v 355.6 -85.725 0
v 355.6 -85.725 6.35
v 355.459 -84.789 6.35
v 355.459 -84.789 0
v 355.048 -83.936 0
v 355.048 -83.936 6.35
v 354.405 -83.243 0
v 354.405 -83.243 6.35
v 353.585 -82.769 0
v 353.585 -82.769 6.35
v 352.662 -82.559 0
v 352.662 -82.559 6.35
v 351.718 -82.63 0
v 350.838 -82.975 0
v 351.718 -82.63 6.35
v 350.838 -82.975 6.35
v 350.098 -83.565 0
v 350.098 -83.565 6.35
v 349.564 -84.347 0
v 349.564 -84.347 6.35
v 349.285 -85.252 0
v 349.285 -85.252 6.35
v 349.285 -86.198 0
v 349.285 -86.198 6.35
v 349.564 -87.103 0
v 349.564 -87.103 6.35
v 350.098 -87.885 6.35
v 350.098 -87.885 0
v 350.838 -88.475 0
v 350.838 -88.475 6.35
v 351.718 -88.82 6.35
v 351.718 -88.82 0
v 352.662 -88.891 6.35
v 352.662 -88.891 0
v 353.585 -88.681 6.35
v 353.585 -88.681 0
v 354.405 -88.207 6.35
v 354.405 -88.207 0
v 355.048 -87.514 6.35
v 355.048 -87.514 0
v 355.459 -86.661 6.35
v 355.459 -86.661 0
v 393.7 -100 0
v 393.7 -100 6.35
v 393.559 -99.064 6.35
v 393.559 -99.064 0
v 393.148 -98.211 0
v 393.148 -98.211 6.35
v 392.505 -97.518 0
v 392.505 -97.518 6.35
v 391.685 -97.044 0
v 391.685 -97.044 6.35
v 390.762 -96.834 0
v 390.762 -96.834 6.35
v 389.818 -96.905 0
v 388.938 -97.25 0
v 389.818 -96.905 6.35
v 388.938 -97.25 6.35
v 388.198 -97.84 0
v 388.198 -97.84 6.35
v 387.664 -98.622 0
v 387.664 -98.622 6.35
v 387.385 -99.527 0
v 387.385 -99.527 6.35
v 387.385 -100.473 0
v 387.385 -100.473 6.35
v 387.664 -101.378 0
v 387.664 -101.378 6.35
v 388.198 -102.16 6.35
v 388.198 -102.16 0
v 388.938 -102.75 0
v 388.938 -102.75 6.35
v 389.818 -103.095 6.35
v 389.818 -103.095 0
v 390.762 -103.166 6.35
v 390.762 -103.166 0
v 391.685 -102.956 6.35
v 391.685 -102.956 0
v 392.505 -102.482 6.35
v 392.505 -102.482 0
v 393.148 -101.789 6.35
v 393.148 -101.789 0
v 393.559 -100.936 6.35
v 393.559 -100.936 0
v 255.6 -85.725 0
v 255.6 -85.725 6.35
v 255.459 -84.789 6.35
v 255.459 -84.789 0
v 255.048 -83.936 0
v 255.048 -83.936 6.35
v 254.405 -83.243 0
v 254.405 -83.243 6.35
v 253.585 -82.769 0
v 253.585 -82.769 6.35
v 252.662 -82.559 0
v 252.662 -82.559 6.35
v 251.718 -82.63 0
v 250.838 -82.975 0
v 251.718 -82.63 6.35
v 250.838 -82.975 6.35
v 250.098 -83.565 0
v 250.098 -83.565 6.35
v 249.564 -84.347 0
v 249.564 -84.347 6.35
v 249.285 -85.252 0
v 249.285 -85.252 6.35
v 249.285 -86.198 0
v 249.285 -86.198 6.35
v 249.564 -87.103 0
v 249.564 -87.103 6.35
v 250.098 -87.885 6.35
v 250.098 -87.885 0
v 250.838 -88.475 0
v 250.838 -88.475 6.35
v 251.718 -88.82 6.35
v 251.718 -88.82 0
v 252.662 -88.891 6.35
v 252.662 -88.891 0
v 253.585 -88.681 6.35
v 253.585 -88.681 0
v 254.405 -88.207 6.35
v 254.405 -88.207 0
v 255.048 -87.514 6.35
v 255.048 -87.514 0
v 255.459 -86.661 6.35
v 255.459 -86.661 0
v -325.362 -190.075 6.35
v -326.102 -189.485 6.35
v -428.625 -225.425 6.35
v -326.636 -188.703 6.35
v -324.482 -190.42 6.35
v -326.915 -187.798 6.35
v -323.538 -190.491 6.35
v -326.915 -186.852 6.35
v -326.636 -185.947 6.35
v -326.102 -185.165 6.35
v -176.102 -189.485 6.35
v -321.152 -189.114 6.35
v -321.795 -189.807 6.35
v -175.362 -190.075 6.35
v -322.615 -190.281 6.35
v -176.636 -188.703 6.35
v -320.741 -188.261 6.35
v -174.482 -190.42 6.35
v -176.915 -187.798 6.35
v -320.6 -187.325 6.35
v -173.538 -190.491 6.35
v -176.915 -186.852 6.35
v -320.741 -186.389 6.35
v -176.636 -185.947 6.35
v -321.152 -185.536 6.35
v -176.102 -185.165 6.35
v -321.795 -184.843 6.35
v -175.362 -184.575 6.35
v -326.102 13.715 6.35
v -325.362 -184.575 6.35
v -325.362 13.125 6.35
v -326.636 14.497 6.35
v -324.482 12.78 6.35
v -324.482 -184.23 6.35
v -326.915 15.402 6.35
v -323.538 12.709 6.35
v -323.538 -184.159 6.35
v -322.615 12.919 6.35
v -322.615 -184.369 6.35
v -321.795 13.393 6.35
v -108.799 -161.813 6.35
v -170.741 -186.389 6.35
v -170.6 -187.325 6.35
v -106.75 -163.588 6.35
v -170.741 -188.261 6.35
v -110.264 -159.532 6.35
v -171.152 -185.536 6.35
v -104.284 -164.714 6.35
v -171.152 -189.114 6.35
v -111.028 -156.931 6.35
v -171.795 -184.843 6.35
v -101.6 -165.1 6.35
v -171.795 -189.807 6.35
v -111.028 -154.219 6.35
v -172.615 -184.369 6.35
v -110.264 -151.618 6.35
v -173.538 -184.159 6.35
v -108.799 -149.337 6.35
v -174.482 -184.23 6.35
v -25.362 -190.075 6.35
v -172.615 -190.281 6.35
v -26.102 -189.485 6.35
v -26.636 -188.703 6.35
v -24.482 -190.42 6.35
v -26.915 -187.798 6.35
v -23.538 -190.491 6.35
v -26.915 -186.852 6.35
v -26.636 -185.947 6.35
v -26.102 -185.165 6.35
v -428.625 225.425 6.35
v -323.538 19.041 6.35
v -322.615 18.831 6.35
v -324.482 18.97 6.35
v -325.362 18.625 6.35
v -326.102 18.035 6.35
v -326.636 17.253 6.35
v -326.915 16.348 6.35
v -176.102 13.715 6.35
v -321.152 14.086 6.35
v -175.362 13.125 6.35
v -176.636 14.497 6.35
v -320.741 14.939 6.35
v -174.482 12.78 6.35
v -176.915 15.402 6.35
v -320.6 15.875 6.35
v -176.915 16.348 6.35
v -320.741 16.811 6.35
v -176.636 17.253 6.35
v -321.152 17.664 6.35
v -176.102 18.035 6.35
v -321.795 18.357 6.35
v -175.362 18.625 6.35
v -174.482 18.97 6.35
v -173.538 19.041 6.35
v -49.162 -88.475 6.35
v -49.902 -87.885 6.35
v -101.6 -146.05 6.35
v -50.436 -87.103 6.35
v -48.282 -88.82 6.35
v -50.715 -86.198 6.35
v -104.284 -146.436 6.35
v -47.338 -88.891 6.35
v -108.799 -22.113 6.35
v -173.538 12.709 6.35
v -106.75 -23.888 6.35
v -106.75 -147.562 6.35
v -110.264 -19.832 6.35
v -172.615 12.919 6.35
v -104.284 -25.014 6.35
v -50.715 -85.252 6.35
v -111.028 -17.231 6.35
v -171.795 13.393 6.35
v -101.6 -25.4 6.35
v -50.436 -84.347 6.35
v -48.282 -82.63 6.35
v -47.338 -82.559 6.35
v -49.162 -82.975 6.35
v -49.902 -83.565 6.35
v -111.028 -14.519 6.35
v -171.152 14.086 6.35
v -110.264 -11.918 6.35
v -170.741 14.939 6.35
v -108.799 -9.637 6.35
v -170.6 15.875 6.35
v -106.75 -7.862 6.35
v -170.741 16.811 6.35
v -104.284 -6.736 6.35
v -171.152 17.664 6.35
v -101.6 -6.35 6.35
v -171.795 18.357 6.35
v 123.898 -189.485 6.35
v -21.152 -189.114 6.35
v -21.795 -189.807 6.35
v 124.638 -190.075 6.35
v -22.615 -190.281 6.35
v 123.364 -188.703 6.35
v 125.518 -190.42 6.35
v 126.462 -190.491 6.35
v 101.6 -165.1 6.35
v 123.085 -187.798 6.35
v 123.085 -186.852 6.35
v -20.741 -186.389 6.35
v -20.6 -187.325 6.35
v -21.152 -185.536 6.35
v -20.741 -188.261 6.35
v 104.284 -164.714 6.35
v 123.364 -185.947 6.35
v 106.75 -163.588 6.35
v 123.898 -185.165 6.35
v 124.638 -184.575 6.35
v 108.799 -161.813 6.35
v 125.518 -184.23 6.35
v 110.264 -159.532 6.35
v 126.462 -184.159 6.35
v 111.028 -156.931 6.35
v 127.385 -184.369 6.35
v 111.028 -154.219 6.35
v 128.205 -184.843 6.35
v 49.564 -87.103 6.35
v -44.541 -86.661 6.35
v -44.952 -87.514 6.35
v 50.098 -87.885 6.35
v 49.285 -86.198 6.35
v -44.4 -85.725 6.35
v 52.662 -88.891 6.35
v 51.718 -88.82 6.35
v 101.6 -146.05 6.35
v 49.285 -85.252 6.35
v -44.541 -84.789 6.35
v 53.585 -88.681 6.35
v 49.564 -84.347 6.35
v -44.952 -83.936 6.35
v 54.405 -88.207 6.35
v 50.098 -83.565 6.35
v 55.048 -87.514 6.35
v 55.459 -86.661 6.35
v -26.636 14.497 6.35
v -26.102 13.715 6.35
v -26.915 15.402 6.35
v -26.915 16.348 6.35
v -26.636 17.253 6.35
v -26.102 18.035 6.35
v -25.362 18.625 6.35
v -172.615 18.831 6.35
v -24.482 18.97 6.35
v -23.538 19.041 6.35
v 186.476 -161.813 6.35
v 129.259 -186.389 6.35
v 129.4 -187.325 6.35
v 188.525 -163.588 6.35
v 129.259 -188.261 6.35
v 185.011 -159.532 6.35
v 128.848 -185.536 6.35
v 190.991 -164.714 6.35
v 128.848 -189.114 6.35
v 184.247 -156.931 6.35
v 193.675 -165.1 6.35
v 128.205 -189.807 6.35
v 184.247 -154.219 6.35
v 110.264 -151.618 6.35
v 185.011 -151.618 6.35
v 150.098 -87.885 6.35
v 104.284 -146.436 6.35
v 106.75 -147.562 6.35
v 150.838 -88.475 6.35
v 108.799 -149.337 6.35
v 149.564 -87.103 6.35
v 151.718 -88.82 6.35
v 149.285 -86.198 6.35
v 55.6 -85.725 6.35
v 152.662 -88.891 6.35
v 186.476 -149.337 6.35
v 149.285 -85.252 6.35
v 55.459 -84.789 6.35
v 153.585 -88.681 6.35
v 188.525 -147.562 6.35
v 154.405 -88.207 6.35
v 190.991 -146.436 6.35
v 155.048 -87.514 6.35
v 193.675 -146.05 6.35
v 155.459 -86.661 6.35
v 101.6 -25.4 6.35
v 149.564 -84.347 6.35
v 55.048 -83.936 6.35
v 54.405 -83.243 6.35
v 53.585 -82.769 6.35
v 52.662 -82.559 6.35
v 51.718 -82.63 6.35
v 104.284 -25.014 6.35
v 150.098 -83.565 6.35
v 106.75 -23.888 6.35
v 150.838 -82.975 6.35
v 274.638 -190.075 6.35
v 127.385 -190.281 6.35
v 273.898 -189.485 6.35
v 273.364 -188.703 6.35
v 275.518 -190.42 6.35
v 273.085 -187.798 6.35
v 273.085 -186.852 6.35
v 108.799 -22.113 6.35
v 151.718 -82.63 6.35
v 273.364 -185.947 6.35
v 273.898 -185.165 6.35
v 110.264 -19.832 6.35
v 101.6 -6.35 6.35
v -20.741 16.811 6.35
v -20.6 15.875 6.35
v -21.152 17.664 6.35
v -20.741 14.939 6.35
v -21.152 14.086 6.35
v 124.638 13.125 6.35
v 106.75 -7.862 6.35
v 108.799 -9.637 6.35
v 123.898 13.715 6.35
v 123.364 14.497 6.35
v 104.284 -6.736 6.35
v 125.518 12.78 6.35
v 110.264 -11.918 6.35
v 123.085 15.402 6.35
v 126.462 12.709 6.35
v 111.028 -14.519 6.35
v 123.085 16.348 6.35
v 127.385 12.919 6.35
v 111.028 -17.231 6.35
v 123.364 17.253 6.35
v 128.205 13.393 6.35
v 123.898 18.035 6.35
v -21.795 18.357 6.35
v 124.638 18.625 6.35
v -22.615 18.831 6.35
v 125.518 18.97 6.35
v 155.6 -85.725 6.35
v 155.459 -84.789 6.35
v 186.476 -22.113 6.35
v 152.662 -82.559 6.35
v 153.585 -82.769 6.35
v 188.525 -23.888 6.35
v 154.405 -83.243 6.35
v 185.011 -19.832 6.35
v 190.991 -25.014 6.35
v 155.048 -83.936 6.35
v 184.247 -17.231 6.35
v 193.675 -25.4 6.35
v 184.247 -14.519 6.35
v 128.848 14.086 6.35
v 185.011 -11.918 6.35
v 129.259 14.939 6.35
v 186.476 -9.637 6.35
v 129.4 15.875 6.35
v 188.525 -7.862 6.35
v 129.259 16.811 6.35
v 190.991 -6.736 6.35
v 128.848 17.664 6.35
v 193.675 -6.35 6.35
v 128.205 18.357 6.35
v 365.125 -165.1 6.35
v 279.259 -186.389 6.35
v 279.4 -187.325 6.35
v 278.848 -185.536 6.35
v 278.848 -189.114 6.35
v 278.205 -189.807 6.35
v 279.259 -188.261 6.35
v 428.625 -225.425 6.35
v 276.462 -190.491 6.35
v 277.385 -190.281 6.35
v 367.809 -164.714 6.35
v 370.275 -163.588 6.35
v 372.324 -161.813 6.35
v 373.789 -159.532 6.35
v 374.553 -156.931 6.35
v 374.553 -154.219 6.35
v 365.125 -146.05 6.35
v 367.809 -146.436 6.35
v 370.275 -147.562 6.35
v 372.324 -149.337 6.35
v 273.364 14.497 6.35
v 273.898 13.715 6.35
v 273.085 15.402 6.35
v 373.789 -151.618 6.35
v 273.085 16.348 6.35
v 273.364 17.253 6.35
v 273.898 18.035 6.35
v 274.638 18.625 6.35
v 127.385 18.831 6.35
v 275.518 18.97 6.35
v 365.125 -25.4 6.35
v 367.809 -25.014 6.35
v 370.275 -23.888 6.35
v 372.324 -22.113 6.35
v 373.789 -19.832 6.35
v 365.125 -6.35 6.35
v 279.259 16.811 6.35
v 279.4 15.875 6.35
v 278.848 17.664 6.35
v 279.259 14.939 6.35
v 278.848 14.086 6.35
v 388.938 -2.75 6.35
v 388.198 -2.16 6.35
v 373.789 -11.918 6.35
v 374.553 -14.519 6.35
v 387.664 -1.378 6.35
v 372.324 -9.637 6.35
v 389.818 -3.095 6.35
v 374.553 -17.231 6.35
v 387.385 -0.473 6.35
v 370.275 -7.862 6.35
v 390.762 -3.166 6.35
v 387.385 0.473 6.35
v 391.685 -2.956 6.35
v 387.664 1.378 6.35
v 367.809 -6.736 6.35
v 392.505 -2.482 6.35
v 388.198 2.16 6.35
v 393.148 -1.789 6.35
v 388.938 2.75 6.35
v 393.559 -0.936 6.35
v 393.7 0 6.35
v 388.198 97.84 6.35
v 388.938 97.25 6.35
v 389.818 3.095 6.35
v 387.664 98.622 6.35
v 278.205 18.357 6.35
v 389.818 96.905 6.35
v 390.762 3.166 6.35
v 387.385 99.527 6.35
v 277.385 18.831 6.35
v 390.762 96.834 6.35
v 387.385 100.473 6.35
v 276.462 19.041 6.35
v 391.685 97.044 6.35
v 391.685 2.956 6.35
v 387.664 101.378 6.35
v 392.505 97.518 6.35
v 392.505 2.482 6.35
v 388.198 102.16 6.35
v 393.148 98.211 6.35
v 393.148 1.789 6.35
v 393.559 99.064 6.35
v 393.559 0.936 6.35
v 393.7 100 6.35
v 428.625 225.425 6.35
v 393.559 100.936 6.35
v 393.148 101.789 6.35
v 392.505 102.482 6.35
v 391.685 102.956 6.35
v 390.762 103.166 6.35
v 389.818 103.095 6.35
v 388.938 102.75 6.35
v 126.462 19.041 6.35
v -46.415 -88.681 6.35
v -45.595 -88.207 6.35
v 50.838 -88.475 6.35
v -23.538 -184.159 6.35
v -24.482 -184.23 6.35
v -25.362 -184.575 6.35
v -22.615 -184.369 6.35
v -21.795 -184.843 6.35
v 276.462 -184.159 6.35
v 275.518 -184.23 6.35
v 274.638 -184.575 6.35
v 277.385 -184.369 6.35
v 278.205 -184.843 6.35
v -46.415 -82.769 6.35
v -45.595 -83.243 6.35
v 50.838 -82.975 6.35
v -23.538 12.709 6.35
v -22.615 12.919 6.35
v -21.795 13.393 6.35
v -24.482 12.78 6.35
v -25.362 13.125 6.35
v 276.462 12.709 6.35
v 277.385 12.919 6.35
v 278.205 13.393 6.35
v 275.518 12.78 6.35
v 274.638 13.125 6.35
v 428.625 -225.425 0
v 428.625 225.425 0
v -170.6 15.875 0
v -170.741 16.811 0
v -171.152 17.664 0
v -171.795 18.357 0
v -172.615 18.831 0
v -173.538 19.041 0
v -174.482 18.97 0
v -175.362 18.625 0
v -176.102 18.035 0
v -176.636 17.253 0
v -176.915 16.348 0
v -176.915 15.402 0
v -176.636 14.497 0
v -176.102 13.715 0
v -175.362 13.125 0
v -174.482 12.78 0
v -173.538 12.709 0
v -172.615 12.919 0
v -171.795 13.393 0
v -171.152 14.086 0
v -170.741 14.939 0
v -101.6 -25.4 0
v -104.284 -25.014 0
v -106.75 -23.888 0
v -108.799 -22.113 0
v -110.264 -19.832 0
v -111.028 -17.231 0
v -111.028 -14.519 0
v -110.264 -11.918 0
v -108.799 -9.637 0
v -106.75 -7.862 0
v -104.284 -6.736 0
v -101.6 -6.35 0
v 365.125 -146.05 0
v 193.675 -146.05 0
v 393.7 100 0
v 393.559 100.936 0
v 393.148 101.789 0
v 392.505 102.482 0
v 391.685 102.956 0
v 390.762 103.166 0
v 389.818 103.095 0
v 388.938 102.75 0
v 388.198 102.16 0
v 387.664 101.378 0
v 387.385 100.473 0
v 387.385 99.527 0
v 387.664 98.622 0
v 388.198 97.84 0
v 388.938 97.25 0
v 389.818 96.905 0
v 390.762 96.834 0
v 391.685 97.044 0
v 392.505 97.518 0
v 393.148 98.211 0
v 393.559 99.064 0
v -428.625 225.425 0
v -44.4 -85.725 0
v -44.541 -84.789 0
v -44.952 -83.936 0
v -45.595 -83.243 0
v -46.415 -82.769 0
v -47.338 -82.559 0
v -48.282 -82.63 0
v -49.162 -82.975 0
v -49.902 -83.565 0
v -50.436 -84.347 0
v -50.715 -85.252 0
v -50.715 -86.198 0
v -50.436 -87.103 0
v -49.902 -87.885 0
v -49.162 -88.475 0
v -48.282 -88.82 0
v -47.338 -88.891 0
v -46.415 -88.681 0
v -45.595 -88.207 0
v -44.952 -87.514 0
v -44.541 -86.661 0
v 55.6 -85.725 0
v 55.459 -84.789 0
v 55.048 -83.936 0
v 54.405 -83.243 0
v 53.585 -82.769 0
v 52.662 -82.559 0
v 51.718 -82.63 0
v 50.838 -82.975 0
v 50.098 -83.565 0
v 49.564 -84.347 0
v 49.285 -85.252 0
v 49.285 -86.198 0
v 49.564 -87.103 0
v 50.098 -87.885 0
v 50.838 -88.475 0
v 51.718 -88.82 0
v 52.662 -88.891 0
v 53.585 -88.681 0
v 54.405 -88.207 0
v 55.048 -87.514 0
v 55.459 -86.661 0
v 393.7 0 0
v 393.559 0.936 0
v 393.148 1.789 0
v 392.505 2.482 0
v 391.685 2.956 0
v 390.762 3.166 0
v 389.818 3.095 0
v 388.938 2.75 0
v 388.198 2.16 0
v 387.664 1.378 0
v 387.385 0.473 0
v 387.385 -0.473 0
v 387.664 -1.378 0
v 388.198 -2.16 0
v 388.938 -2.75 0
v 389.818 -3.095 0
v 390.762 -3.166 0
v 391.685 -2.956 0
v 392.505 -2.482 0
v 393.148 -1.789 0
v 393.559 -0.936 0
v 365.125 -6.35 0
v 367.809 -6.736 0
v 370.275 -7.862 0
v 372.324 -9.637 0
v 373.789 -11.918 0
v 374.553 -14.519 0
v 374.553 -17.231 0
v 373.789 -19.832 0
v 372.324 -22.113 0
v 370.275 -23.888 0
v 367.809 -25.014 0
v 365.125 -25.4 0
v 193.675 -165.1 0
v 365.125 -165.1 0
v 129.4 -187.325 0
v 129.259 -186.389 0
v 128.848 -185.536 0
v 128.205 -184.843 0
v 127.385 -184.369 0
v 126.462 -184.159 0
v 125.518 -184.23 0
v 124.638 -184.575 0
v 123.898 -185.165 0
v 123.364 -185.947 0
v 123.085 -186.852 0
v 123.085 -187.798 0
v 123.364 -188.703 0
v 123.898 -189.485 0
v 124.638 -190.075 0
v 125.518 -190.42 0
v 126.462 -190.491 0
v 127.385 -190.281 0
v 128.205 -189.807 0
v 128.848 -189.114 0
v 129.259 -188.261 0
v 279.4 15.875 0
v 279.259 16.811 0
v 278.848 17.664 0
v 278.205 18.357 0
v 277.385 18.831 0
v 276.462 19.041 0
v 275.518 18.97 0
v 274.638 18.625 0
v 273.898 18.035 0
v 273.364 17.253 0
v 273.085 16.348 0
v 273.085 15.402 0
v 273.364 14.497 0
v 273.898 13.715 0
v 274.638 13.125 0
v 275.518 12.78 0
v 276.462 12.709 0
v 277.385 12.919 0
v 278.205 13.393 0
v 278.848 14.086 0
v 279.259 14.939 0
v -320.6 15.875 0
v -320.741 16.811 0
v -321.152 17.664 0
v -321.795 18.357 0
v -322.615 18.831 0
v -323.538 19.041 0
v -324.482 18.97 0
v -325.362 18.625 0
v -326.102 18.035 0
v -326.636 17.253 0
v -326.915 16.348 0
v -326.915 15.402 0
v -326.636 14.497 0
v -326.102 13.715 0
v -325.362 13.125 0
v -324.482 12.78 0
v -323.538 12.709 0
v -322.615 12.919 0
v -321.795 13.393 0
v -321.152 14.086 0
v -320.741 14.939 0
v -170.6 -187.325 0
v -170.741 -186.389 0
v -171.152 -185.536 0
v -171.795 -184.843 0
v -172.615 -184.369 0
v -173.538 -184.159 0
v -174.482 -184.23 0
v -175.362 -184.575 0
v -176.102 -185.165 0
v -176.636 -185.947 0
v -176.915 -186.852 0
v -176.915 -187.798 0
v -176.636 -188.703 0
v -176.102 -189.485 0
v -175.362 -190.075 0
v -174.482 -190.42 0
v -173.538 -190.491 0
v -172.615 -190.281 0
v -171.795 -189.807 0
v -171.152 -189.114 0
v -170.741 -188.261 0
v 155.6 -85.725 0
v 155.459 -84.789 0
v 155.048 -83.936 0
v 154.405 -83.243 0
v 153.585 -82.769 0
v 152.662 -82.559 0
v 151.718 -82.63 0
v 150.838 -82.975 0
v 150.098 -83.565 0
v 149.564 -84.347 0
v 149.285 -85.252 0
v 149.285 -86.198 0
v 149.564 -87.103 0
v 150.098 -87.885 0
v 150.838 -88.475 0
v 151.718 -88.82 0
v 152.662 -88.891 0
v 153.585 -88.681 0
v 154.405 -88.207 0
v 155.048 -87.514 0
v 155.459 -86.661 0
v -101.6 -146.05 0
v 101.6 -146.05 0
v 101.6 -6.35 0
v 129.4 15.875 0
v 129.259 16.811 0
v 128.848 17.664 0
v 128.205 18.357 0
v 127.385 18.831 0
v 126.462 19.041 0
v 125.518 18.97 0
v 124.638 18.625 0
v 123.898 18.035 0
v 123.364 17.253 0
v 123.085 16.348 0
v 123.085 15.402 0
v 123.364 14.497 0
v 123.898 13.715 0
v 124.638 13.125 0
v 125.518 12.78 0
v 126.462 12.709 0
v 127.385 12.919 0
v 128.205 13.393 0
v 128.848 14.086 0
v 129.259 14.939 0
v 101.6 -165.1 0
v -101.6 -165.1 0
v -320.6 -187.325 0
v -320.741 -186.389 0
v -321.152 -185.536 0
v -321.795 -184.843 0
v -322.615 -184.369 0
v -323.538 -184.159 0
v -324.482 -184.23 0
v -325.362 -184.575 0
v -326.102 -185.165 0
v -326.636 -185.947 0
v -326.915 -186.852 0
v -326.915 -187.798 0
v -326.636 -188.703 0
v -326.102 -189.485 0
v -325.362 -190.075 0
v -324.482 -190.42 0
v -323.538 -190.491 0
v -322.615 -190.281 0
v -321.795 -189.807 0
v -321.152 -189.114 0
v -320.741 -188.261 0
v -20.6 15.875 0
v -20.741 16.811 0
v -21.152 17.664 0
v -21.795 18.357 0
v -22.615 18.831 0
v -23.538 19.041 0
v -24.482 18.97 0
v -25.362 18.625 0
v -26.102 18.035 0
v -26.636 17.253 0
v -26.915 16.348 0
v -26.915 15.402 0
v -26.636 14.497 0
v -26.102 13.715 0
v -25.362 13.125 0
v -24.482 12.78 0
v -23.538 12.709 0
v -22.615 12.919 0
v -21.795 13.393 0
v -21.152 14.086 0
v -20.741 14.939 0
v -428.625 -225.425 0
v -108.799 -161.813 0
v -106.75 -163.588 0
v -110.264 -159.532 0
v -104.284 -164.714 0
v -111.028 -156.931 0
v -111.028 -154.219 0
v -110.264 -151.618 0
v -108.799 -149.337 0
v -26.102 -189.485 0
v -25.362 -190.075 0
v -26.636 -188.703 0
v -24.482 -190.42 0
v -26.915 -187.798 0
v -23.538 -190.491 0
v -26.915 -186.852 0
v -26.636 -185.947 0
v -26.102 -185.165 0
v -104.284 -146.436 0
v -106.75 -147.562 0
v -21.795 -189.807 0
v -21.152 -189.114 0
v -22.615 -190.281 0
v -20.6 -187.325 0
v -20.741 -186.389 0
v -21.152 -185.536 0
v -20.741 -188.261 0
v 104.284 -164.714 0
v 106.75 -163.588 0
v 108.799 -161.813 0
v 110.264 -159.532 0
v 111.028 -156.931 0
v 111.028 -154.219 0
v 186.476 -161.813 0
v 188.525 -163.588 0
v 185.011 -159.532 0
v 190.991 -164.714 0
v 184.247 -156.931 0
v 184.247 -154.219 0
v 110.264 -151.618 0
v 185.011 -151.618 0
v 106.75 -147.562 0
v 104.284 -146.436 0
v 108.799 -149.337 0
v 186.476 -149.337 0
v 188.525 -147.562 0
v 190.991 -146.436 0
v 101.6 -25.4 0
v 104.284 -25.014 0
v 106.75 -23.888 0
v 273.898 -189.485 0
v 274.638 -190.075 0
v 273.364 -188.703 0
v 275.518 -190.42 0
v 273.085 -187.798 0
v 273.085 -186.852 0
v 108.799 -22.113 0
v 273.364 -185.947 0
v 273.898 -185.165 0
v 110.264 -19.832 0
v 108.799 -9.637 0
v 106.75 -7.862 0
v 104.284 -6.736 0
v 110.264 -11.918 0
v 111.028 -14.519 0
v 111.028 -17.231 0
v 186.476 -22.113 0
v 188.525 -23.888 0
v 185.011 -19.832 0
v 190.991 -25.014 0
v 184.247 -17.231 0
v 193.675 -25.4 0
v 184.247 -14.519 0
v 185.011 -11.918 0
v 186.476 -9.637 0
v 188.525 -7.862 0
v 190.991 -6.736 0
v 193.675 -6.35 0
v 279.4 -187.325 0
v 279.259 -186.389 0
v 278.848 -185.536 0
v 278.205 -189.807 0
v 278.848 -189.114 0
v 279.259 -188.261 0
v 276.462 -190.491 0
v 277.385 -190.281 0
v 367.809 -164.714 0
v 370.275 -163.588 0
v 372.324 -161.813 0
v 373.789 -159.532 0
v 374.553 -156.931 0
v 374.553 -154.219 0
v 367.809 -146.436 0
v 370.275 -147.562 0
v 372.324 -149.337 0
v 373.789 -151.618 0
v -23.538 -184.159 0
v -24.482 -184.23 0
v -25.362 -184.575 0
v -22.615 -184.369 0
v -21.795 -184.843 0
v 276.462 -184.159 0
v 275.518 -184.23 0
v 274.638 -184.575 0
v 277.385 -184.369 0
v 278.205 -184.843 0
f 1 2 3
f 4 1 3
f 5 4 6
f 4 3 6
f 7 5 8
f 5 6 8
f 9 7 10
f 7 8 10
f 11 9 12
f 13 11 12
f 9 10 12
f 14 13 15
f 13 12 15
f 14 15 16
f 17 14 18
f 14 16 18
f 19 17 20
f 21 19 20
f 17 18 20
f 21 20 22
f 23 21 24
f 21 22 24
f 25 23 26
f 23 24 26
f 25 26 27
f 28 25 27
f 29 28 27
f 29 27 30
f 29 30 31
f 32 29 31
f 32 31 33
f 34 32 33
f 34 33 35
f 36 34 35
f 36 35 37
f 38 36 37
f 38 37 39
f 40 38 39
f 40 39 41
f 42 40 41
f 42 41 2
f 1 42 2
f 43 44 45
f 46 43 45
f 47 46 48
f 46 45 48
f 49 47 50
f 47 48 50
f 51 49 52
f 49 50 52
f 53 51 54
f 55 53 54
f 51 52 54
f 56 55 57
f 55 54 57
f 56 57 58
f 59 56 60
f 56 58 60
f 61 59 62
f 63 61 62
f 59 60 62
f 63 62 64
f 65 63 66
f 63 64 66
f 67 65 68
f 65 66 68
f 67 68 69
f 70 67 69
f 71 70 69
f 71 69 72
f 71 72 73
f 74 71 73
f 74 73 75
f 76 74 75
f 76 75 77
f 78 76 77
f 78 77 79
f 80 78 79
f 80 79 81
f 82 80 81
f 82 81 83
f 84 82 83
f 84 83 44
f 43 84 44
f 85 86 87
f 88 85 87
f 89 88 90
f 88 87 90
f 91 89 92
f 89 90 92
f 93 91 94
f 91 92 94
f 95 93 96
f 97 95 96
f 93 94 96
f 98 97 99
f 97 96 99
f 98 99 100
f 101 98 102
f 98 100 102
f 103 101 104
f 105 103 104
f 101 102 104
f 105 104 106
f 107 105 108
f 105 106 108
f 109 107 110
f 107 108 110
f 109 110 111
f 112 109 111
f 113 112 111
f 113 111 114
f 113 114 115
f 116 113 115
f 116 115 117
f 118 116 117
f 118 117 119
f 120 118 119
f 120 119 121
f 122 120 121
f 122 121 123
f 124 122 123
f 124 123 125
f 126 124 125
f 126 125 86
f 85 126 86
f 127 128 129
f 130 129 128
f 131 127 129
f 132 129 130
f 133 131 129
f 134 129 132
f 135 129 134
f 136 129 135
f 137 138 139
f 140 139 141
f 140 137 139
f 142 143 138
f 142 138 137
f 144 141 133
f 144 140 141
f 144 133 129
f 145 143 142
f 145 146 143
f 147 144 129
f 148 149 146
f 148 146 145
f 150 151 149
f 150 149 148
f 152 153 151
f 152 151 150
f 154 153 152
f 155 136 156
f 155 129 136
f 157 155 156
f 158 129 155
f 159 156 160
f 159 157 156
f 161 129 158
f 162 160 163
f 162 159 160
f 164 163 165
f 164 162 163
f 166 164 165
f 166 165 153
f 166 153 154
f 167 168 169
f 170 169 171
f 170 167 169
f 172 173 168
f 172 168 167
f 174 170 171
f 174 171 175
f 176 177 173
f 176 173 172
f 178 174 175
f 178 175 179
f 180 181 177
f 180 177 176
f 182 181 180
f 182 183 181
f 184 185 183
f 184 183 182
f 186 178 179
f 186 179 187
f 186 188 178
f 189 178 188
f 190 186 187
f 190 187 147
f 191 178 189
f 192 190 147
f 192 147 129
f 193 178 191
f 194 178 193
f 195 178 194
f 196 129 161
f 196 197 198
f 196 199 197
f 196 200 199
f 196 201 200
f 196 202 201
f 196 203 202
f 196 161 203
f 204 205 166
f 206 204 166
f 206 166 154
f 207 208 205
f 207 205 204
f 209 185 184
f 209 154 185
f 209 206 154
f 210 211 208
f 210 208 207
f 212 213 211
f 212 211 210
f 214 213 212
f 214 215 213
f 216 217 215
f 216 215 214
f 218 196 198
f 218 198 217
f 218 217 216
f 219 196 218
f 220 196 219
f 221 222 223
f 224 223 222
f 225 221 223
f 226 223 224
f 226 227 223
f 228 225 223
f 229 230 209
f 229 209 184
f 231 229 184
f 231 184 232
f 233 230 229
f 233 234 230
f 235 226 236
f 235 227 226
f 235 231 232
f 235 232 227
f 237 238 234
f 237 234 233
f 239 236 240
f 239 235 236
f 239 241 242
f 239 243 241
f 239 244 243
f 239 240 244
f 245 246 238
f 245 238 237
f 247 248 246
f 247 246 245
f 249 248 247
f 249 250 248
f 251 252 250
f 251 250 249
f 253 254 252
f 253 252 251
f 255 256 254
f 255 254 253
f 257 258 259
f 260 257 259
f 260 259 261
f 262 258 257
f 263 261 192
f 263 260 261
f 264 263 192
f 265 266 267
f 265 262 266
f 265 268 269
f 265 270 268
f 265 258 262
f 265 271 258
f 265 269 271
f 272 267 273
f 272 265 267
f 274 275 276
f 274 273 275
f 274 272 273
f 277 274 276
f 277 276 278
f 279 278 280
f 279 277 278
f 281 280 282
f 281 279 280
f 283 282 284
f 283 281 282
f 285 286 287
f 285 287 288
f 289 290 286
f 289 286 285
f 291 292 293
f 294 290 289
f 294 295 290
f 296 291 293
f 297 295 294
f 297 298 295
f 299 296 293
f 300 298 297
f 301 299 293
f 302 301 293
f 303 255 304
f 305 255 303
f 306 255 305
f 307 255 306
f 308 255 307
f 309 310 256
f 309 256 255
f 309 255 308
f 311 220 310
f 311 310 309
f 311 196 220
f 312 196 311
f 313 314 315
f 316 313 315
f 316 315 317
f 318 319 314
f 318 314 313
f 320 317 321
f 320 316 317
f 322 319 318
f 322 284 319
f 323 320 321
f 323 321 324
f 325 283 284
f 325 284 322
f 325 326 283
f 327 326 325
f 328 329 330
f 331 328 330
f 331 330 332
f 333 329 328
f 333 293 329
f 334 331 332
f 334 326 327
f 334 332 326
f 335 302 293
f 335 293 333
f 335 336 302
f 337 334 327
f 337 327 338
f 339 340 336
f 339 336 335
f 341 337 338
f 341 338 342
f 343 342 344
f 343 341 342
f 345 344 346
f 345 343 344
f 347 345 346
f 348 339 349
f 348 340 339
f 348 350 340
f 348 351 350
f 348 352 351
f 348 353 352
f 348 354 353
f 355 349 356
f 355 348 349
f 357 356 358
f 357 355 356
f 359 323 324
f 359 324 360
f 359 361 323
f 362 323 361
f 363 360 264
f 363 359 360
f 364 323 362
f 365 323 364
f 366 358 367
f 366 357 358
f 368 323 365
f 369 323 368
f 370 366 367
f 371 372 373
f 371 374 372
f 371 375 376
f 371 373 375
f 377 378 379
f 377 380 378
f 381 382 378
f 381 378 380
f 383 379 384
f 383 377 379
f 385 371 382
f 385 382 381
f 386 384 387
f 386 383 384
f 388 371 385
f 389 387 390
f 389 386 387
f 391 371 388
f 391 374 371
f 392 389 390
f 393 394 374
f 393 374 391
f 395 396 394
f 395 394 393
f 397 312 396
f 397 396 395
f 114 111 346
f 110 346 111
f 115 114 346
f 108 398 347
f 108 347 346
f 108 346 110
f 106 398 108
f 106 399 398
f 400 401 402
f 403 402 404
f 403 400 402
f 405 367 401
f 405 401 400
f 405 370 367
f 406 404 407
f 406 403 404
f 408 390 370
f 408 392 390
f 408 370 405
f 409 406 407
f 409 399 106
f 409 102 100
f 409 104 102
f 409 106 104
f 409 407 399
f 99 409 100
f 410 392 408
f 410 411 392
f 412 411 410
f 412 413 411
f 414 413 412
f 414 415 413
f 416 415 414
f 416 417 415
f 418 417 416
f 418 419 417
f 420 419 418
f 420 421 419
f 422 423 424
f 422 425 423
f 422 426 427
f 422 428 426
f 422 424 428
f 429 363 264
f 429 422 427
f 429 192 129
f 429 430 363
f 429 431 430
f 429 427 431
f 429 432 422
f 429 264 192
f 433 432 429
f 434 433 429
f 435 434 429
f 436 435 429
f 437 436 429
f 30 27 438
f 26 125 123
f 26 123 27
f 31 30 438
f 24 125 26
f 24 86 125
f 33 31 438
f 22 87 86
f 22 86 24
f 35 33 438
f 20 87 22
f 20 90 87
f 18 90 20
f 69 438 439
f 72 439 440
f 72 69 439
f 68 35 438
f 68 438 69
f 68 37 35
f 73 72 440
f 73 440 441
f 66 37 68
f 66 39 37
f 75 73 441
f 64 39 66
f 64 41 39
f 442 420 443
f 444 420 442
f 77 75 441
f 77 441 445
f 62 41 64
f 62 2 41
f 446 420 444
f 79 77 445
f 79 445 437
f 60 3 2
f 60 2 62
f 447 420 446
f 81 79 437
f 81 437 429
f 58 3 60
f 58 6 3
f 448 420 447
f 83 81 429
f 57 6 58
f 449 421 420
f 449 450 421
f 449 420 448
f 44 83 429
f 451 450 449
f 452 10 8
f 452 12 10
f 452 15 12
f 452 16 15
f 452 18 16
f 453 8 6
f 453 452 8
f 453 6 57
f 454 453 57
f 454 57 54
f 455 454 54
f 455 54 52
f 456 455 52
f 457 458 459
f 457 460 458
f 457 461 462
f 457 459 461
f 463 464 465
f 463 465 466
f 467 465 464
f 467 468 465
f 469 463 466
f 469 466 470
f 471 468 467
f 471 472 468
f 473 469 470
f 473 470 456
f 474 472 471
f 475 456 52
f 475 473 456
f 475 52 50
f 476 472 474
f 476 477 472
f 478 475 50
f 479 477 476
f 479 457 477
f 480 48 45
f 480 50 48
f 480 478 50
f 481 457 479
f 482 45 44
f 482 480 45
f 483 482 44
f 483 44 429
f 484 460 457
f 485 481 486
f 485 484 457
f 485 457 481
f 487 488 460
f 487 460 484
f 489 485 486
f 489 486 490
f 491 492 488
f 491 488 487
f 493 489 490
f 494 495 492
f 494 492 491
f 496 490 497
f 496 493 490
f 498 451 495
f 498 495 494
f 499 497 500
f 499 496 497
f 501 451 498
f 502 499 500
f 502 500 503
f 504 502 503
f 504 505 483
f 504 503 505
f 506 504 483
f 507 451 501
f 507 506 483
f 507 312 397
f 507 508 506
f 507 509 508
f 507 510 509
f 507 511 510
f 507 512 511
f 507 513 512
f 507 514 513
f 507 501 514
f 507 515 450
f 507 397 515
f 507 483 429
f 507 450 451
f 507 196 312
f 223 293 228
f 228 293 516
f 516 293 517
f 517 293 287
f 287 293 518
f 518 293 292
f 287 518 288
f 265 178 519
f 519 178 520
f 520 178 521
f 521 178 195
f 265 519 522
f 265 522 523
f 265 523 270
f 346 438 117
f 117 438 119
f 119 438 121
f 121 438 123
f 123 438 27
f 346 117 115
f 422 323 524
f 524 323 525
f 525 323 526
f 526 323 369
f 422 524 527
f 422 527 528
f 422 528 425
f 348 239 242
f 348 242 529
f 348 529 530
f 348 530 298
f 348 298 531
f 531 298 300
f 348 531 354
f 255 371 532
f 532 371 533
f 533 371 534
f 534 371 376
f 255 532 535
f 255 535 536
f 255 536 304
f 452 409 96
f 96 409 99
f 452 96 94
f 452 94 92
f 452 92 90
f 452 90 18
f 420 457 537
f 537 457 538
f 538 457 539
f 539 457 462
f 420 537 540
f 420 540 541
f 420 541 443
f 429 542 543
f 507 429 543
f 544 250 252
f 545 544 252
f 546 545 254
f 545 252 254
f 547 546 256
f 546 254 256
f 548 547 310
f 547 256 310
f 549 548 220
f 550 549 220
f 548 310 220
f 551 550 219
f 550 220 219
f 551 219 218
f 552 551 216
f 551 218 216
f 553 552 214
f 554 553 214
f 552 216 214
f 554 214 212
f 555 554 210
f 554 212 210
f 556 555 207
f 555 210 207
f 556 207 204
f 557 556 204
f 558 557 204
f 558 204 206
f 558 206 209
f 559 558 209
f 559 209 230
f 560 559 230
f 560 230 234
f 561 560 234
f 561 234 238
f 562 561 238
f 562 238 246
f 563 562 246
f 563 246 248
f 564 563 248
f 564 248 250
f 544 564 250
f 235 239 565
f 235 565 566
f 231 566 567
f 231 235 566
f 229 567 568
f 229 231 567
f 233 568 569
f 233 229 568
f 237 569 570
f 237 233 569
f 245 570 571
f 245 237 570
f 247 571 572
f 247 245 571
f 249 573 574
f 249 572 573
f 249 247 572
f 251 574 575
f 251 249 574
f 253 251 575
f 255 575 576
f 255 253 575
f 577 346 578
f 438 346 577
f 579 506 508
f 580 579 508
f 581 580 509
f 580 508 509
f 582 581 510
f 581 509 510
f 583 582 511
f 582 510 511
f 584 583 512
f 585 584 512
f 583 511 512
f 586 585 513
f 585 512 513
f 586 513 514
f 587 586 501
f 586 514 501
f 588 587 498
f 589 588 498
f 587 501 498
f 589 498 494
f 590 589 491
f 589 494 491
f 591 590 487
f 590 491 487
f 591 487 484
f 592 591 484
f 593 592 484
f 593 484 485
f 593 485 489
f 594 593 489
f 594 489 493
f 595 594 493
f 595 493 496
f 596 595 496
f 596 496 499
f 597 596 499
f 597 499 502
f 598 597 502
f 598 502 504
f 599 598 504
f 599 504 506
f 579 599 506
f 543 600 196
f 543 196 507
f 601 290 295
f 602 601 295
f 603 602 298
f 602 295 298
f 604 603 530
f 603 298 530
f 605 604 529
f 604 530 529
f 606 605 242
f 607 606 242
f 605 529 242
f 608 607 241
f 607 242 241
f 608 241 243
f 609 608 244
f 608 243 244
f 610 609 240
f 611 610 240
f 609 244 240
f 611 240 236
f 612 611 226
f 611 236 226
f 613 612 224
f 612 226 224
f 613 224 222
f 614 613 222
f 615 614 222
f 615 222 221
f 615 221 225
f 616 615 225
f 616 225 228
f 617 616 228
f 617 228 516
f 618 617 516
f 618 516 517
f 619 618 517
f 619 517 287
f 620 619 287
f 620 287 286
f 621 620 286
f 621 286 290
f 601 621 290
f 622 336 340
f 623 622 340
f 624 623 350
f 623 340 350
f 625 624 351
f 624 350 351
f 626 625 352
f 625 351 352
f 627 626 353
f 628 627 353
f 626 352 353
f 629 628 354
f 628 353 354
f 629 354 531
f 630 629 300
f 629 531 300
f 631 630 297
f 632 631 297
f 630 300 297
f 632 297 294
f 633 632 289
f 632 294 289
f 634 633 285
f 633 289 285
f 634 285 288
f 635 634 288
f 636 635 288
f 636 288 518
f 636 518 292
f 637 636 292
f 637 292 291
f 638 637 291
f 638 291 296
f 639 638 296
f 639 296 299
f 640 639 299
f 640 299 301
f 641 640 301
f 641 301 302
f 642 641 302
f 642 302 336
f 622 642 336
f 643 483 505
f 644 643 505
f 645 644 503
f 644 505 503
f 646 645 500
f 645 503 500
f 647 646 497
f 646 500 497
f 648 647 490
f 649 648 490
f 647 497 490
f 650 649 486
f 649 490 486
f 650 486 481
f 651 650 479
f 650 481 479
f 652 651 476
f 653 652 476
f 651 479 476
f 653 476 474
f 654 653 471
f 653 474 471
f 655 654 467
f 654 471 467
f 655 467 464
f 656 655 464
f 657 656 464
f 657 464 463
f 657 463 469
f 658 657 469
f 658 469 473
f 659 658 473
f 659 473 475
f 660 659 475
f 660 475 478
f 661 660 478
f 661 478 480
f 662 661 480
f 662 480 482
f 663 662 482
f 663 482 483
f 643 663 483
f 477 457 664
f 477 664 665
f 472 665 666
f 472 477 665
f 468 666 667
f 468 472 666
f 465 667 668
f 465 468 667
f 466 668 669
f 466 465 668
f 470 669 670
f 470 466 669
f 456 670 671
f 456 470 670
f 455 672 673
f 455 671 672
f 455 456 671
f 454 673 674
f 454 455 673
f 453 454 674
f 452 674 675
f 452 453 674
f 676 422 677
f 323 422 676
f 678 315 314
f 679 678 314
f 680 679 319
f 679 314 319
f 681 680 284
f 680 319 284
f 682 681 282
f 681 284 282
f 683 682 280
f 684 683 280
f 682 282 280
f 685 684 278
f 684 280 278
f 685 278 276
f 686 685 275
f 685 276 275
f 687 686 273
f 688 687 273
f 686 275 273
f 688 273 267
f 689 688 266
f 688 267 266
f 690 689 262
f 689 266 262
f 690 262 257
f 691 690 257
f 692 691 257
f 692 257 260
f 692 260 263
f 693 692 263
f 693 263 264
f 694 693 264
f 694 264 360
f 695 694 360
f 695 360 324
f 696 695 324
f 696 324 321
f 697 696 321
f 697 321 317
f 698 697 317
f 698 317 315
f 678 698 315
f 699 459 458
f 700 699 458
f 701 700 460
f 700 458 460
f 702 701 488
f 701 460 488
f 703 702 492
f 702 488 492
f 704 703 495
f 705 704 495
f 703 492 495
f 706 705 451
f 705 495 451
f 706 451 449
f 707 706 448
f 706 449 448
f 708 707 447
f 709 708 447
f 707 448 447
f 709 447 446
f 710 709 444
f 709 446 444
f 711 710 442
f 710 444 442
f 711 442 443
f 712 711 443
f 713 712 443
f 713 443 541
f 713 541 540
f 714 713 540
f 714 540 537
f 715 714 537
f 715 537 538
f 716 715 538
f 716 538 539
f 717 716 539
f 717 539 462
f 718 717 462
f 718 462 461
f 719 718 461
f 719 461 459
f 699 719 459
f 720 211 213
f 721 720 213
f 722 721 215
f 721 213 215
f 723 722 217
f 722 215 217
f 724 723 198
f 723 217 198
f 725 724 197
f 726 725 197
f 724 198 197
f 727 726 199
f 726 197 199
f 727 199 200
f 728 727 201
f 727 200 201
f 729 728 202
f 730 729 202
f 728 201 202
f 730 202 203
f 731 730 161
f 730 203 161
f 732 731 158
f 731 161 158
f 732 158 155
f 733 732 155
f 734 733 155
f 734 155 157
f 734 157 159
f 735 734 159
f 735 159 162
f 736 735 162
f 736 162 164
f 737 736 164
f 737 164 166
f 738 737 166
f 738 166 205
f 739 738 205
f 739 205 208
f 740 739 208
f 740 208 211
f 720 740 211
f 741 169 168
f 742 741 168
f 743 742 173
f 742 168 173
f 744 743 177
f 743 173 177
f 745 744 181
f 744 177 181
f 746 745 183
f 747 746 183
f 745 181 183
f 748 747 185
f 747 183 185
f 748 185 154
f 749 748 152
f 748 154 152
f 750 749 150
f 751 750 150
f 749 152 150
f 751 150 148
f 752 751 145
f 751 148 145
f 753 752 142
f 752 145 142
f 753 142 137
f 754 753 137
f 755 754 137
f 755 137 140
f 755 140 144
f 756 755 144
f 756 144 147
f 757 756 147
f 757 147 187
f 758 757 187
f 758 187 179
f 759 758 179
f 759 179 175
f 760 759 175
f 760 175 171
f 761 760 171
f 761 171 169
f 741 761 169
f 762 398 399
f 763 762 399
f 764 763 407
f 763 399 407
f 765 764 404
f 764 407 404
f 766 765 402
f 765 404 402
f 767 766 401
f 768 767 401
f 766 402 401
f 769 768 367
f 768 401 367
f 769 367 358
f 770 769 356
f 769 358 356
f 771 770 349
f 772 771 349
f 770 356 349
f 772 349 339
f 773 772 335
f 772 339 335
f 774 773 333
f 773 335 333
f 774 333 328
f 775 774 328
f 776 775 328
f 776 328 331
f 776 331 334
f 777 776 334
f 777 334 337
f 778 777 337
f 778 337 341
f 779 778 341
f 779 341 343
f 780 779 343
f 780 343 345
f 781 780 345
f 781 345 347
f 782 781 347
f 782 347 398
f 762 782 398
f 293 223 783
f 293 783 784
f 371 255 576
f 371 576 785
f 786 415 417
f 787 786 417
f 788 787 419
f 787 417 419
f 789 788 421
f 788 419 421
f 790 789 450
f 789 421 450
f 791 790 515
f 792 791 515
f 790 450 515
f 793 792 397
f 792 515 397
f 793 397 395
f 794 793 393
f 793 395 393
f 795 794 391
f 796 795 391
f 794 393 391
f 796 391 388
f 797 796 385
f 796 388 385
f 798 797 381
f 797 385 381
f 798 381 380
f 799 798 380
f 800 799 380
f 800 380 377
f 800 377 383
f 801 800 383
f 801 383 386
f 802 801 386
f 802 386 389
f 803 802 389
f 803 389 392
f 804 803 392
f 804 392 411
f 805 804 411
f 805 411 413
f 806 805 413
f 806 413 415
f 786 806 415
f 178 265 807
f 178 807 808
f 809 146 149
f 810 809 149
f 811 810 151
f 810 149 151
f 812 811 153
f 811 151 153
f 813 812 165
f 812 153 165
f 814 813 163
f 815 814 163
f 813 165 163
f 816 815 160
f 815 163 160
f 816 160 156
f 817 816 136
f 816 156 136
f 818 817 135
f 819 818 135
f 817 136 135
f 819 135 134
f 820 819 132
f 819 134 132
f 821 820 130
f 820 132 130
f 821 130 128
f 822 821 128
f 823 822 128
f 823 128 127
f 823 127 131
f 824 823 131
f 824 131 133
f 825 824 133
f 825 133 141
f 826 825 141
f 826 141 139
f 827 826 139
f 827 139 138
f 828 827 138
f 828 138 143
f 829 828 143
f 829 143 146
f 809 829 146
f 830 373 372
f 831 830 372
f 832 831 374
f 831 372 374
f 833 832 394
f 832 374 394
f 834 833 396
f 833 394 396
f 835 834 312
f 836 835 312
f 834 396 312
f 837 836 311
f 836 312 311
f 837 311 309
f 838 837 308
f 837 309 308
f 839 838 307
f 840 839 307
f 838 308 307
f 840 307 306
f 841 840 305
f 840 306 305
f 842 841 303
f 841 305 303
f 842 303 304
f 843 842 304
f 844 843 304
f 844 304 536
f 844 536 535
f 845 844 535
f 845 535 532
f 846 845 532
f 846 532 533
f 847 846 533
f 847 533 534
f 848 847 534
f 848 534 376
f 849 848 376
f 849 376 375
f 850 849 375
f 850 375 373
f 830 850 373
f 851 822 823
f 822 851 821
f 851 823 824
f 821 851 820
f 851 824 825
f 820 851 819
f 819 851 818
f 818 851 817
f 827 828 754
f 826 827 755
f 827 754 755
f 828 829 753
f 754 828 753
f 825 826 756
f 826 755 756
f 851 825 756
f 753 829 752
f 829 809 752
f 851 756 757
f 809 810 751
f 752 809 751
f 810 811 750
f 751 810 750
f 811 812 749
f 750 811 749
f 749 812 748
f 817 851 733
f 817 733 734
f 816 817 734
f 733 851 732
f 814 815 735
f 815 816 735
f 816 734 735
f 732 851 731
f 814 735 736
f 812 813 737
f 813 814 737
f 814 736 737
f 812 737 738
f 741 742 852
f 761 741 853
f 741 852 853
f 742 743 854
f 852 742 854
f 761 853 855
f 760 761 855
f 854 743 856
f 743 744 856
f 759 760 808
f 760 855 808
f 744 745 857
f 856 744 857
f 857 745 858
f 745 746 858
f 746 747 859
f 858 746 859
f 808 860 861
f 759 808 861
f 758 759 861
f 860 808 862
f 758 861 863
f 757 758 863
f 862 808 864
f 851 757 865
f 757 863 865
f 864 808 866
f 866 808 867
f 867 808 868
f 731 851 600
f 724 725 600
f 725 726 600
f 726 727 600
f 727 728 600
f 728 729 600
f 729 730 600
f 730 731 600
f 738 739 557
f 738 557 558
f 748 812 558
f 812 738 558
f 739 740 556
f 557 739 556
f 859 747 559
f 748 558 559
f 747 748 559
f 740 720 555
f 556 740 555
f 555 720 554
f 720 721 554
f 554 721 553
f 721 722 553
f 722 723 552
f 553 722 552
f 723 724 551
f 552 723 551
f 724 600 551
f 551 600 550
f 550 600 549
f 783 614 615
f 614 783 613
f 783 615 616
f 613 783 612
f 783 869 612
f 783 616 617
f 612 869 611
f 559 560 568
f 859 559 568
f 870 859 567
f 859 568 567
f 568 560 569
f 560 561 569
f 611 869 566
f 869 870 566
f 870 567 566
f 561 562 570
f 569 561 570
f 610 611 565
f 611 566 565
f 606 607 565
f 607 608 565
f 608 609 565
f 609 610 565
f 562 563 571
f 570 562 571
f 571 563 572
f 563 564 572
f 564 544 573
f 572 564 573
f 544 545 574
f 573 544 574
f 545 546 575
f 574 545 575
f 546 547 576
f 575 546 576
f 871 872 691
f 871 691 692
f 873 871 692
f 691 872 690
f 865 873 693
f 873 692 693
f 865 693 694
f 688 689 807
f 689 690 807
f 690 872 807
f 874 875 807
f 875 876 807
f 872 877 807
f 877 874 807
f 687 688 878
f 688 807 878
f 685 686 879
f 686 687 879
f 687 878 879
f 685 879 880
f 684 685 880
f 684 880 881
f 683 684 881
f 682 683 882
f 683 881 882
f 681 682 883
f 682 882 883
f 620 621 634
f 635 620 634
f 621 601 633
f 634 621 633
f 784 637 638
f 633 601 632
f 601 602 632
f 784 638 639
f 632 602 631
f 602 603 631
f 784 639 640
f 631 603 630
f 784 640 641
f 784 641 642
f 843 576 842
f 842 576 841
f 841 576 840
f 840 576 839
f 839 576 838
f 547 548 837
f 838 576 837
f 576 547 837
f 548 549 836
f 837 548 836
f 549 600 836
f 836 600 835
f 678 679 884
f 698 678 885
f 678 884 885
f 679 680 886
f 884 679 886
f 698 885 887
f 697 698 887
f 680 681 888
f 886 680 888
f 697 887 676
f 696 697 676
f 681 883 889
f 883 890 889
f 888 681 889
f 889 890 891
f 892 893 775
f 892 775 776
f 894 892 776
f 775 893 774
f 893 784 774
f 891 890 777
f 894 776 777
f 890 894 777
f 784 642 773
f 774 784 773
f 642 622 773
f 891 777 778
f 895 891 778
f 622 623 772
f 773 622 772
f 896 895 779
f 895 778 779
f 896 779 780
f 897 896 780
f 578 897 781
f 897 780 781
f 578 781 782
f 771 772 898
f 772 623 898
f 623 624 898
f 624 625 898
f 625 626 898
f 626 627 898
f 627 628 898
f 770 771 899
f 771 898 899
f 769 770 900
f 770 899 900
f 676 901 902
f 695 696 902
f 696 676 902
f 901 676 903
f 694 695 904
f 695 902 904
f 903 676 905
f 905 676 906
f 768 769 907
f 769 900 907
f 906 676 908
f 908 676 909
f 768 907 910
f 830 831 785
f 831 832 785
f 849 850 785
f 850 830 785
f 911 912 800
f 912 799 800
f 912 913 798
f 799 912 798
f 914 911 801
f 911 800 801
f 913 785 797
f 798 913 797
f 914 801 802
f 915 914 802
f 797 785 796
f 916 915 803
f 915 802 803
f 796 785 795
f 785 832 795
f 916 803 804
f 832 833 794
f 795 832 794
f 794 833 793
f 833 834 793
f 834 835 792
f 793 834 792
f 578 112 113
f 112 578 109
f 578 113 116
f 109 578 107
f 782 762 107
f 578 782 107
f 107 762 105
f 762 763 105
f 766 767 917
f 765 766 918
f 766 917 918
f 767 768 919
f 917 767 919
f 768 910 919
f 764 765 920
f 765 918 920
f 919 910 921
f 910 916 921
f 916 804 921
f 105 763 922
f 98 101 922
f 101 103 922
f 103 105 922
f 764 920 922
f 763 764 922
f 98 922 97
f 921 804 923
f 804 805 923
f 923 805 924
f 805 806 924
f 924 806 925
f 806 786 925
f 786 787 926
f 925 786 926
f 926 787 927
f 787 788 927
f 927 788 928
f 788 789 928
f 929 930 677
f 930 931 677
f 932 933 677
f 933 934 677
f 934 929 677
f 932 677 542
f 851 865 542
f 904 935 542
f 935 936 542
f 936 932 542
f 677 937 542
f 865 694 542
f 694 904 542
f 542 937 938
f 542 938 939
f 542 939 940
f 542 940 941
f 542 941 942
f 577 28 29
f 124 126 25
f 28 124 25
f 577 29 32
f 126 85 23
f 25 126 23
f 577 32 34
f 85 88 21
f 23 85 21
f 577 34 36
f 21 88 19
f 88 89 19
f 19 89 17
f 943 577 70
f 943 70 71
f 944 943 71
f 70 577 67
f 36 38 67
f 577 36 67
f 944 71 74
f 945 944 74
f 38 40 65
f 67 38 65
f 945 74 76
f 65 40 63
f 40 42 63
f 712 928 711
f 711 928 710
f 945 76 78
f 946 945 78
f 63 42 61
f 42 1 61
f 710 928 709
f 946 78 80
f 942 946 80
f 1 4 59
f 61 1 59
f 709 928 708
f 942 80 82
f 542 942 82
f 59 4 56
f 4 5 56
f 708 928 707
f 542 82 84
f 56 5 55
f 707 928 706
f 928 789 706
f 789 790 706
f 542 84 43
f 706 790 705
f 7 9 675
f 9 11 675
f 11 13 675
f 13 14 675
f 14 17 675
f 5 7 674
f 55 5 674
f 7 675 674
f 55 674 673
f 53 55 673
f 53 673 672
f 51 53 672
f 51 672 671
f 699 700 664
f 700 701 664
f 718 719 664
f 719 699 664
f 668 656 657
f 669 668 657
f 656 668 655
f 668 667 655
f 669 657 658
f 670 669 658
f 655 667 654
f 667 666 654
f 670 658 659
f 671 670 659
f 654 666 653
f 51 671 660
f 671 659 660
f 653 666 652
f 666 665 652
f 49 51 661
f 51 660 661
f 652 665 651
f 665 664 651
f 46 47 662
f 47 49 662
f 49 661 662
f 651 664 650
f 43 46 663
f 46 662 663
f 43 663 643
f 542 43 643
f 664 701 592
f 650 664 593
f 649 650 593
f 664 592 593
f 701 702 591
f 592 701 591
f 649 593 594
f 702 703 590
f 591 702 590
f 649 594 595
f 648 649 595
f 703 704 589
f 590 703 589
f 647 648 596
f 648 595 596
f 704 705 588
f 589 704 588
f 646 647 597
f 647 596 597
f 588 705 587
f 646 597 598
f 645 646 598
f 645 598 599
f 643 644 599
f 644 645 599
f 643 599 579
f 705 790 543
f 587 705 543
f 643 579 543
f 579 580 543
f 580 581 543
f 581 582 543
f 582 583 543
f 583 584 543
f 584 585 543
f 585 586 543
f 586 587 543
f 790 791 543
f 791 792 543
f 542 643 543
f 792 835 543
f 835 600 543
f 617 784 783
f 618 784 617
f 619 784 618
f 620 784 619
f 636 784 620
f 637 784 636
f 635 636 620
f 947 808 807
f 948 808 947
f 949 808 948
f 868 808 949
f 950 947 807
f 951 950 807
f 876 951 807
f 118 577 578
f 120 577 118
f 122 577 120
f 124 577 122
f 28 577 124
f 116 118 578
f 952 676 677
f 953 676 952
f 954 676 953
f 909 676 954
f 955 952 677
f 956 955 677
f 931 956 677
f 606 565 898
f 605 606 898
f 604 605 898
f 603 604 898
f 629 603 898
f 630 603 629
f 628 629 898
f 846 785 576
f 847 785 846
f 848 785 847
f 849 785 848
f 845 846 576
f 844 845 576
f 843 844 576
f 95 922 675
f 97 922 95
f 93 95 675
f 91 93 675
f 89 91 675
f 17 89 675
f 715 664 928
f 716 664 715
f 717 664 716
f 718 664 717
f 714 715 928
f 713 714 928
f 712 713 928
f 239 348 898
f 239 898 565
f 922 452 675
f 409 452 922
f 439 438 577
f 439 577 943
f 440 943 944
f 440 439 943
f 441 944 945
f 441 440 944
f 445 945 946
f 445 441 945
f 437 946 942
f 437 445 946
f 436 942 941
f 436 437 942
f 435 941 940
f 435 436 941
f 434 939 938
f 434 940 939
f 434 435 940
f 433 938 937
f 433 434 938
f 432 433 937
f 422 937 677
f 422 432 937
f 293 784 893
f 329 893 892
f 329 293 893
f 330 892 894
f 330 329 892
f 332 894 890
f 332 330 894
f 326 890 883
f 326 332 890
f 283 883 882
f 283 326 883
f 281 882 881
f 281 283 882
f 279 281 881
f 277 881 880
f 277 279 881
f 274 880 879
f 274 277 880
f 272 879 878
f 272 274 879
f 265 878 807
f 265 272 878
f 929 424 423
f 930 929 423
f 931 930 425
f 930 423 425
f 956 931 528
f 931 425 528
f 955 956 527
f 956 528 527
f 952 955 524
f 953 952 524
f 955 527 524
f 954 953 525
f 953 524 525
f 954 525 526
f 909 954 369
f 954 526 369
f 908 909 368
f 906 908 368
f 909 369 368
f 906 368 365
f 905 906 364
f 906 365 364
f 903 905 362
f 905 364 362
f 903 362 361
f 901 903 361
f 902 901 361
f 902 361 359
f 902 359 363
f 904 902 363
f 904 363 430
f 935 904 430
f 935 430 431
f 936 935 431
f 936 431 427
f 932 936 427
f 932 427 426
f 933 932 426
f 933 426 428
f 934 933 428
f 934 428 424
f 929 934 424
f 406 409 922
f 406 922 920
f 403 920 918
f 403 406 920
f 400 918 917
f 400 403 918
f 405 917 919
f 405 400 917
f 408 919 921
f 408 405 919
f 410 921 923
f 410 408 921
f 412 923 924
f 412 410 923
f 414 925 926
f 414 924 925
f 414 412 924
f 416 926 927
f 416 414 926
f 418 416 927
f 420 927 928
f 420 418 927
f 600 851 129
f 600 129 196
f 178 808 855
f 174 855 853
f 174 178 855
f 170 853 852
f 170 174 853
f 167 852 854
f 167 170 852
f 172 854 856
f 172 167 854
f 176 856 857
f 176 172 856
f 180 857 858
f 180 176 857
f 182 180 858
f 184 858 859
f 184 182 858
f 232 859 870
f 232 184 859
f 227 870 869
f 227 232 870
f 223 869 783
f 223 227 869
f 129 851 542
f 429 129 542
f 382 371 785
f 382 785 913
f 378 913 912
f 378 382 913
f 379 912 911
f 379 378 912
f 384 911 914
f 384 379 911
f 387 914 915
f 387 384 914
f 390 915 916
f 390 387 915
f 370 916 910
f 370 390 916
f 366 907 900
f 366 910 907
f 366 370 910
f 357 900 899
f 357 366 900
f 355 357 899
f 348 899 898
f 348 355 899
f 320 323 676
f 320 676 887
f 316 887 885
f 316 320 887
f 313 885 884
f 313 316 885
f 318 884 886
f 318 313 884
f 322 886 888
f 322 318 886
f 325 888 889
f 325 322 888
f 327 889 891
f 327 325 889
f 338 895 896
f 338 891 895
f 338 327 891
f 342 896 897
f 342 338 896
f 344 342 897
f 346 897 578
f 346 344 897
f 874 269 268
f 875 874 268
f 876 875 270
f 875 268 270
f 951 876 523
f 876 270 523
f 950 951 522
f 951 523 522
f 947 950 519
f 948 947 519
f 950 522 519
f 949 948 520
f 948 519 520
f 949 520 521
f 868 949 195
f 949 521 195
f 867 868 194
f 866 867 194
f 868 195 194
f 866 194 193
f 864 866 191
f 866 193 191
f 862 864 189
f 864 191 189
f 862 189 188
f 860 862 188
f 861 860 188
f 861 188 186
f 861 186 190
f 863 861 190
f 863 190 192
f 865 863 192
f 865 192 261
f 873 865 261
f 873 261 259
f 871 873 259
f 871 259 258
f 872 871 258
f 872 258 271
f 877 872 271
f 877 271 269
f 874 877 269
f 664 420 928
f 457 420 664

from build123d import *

# Parameters (mm, degrees)
SKETCH1_W           = 857.25
SKETCH1_H           = 450.85
BOSS_EXTRUDE1_DEPTH = 6.35
SKETCH2_R           = 3.175
CUT_EXTRUDE1_DEPTH  = 485.330614095
SKETCH3_R           = 3.175
CUT_EXTRUDE2_DEPTH  = 485.330614095


with BuildPart() as part:
    # Sketch1 → Boss-Extrude1 (new body)
    with BuildSketch(Plane.XY):
        Rectangle(SKETCH1_W, SKETCH1_H)
    extrude(amount=BOSS_EXTRUDE1_DEPTH)

    # Sketch2 → Cut-Extrude1 (cut, through all)
    with BuildSketch(Plane.XY.offset(6.35)):
        with Locations((352.425, -85.725)):
            Circle(SKETCH2_R)
        with Locations((252.425000102, -85.725)):
            Circle(SKETCH2_R)
        with Locations((152.425000204, -85.725)):
            Circle(SKETCH2_R)
        with Locations((52.425000306, -85.725)):
            Circle(SKETCH2_R)
        with Locations((-47.574999592, -85.725)):
            Circle(SKETCH2_R)
        with Locations((276.225, -187.325)):
            Circle(SKETCH2_R)
        with Locations((126.225000026, -187.325)):
            Circle(SKETCH2_R)
        with Locations((-23.774999948, -187.325)):
            Circle(SKETCH2_R)
        with Locations((-173.774999922, -187.325)):
            Circle(SKETCH2_R)
        with Locations((-323.774999896, -187.325)):
            Circle(SKETCH2_R)
        with Locations((276.225, 15.875)):
            Circle(SKETCH2_R)
        with Locations((126.225000026, 15.875)):
            Circle(SKETCH2_R)
        with Locations((-23.774999948, 15.875)):
            Circle(SKETCH2_R)
        with Locations((-173.774999922, 15.875)):
            Circle(SKETCH2_R)
        with Locations((-323.774999896, 15.875)):
            Circle(SKETCH2_R)
        with BuildLine():
            Line((-101.6, -146.05), (101.6, -146.05))
            ThreePointArc((101.6, -146.05), (111.125, -155.575), (101.6, -165.1))
            Line((101.6, -165.1), (-101.6, -165.1))
            ThreePointArc((-101.6, -165.1), (-111.125, -155.575), (-101.6, -146.05))
        make_face()
        with BuildLine():
            Line((193.675, -146.05), (365.125, -146.05))
            ThreePointArc((365.125, -146.05), (374.65, -155.575), (365.125, -165.1))
            Line((365.125, -165.1), (193.675, -165.1))
            ThreePointArc((193.675, -165.1), (184.15, -155.575), (193.675, -146.05))
        make_face()
        with BuildLine():
            Line((365.125, -25.4), (193.675, -25.4))
            ThreePointArc((193.675, -25.4), (184.15, -15.875), (193.675, -6.35))
            Line((193.675, -6.35), (365.125, -6.35))
            ThreePointArc((365.125, -6.35), (374.65, -15.875), (365.125, -25.4))
        make_face()
        with BuildLine():
            Line((101.6, -25.4), (-101.6, -25.4))
            ThreePointArc((-101.6, -25.4), (-111.125, -15.875), (-101.6, -6.35))
            Line((-101.6, -6.35), (101.6, -6.35))
            ThreePointArc((101.6, -6.35), (111.125, -15.875), (101.6, -25.4))
        make_face()
    extrude(amount=-CUT_EXTRUDE1_DEPTH, mode=Mode.SUBTRACT)

    # Sketch3 → Cut-Extrude2 (cut, through all)
    with BuildSketch(Plane.XY.offset(6.35)):
        with Locations((390.525, -100.000000152)):
            Circle(SKETCH3_R)
        with Locations((390.525, 0)):
            Circle(SKETCH3_R)
        with Locations((390.525, 100.000000152)):
            Circle(SKETCH3_R)
    extrude(amount=-CUT_EXTRUDE2_DEPTH, mode=Mode.SUBTRACT)


solid = part.part
